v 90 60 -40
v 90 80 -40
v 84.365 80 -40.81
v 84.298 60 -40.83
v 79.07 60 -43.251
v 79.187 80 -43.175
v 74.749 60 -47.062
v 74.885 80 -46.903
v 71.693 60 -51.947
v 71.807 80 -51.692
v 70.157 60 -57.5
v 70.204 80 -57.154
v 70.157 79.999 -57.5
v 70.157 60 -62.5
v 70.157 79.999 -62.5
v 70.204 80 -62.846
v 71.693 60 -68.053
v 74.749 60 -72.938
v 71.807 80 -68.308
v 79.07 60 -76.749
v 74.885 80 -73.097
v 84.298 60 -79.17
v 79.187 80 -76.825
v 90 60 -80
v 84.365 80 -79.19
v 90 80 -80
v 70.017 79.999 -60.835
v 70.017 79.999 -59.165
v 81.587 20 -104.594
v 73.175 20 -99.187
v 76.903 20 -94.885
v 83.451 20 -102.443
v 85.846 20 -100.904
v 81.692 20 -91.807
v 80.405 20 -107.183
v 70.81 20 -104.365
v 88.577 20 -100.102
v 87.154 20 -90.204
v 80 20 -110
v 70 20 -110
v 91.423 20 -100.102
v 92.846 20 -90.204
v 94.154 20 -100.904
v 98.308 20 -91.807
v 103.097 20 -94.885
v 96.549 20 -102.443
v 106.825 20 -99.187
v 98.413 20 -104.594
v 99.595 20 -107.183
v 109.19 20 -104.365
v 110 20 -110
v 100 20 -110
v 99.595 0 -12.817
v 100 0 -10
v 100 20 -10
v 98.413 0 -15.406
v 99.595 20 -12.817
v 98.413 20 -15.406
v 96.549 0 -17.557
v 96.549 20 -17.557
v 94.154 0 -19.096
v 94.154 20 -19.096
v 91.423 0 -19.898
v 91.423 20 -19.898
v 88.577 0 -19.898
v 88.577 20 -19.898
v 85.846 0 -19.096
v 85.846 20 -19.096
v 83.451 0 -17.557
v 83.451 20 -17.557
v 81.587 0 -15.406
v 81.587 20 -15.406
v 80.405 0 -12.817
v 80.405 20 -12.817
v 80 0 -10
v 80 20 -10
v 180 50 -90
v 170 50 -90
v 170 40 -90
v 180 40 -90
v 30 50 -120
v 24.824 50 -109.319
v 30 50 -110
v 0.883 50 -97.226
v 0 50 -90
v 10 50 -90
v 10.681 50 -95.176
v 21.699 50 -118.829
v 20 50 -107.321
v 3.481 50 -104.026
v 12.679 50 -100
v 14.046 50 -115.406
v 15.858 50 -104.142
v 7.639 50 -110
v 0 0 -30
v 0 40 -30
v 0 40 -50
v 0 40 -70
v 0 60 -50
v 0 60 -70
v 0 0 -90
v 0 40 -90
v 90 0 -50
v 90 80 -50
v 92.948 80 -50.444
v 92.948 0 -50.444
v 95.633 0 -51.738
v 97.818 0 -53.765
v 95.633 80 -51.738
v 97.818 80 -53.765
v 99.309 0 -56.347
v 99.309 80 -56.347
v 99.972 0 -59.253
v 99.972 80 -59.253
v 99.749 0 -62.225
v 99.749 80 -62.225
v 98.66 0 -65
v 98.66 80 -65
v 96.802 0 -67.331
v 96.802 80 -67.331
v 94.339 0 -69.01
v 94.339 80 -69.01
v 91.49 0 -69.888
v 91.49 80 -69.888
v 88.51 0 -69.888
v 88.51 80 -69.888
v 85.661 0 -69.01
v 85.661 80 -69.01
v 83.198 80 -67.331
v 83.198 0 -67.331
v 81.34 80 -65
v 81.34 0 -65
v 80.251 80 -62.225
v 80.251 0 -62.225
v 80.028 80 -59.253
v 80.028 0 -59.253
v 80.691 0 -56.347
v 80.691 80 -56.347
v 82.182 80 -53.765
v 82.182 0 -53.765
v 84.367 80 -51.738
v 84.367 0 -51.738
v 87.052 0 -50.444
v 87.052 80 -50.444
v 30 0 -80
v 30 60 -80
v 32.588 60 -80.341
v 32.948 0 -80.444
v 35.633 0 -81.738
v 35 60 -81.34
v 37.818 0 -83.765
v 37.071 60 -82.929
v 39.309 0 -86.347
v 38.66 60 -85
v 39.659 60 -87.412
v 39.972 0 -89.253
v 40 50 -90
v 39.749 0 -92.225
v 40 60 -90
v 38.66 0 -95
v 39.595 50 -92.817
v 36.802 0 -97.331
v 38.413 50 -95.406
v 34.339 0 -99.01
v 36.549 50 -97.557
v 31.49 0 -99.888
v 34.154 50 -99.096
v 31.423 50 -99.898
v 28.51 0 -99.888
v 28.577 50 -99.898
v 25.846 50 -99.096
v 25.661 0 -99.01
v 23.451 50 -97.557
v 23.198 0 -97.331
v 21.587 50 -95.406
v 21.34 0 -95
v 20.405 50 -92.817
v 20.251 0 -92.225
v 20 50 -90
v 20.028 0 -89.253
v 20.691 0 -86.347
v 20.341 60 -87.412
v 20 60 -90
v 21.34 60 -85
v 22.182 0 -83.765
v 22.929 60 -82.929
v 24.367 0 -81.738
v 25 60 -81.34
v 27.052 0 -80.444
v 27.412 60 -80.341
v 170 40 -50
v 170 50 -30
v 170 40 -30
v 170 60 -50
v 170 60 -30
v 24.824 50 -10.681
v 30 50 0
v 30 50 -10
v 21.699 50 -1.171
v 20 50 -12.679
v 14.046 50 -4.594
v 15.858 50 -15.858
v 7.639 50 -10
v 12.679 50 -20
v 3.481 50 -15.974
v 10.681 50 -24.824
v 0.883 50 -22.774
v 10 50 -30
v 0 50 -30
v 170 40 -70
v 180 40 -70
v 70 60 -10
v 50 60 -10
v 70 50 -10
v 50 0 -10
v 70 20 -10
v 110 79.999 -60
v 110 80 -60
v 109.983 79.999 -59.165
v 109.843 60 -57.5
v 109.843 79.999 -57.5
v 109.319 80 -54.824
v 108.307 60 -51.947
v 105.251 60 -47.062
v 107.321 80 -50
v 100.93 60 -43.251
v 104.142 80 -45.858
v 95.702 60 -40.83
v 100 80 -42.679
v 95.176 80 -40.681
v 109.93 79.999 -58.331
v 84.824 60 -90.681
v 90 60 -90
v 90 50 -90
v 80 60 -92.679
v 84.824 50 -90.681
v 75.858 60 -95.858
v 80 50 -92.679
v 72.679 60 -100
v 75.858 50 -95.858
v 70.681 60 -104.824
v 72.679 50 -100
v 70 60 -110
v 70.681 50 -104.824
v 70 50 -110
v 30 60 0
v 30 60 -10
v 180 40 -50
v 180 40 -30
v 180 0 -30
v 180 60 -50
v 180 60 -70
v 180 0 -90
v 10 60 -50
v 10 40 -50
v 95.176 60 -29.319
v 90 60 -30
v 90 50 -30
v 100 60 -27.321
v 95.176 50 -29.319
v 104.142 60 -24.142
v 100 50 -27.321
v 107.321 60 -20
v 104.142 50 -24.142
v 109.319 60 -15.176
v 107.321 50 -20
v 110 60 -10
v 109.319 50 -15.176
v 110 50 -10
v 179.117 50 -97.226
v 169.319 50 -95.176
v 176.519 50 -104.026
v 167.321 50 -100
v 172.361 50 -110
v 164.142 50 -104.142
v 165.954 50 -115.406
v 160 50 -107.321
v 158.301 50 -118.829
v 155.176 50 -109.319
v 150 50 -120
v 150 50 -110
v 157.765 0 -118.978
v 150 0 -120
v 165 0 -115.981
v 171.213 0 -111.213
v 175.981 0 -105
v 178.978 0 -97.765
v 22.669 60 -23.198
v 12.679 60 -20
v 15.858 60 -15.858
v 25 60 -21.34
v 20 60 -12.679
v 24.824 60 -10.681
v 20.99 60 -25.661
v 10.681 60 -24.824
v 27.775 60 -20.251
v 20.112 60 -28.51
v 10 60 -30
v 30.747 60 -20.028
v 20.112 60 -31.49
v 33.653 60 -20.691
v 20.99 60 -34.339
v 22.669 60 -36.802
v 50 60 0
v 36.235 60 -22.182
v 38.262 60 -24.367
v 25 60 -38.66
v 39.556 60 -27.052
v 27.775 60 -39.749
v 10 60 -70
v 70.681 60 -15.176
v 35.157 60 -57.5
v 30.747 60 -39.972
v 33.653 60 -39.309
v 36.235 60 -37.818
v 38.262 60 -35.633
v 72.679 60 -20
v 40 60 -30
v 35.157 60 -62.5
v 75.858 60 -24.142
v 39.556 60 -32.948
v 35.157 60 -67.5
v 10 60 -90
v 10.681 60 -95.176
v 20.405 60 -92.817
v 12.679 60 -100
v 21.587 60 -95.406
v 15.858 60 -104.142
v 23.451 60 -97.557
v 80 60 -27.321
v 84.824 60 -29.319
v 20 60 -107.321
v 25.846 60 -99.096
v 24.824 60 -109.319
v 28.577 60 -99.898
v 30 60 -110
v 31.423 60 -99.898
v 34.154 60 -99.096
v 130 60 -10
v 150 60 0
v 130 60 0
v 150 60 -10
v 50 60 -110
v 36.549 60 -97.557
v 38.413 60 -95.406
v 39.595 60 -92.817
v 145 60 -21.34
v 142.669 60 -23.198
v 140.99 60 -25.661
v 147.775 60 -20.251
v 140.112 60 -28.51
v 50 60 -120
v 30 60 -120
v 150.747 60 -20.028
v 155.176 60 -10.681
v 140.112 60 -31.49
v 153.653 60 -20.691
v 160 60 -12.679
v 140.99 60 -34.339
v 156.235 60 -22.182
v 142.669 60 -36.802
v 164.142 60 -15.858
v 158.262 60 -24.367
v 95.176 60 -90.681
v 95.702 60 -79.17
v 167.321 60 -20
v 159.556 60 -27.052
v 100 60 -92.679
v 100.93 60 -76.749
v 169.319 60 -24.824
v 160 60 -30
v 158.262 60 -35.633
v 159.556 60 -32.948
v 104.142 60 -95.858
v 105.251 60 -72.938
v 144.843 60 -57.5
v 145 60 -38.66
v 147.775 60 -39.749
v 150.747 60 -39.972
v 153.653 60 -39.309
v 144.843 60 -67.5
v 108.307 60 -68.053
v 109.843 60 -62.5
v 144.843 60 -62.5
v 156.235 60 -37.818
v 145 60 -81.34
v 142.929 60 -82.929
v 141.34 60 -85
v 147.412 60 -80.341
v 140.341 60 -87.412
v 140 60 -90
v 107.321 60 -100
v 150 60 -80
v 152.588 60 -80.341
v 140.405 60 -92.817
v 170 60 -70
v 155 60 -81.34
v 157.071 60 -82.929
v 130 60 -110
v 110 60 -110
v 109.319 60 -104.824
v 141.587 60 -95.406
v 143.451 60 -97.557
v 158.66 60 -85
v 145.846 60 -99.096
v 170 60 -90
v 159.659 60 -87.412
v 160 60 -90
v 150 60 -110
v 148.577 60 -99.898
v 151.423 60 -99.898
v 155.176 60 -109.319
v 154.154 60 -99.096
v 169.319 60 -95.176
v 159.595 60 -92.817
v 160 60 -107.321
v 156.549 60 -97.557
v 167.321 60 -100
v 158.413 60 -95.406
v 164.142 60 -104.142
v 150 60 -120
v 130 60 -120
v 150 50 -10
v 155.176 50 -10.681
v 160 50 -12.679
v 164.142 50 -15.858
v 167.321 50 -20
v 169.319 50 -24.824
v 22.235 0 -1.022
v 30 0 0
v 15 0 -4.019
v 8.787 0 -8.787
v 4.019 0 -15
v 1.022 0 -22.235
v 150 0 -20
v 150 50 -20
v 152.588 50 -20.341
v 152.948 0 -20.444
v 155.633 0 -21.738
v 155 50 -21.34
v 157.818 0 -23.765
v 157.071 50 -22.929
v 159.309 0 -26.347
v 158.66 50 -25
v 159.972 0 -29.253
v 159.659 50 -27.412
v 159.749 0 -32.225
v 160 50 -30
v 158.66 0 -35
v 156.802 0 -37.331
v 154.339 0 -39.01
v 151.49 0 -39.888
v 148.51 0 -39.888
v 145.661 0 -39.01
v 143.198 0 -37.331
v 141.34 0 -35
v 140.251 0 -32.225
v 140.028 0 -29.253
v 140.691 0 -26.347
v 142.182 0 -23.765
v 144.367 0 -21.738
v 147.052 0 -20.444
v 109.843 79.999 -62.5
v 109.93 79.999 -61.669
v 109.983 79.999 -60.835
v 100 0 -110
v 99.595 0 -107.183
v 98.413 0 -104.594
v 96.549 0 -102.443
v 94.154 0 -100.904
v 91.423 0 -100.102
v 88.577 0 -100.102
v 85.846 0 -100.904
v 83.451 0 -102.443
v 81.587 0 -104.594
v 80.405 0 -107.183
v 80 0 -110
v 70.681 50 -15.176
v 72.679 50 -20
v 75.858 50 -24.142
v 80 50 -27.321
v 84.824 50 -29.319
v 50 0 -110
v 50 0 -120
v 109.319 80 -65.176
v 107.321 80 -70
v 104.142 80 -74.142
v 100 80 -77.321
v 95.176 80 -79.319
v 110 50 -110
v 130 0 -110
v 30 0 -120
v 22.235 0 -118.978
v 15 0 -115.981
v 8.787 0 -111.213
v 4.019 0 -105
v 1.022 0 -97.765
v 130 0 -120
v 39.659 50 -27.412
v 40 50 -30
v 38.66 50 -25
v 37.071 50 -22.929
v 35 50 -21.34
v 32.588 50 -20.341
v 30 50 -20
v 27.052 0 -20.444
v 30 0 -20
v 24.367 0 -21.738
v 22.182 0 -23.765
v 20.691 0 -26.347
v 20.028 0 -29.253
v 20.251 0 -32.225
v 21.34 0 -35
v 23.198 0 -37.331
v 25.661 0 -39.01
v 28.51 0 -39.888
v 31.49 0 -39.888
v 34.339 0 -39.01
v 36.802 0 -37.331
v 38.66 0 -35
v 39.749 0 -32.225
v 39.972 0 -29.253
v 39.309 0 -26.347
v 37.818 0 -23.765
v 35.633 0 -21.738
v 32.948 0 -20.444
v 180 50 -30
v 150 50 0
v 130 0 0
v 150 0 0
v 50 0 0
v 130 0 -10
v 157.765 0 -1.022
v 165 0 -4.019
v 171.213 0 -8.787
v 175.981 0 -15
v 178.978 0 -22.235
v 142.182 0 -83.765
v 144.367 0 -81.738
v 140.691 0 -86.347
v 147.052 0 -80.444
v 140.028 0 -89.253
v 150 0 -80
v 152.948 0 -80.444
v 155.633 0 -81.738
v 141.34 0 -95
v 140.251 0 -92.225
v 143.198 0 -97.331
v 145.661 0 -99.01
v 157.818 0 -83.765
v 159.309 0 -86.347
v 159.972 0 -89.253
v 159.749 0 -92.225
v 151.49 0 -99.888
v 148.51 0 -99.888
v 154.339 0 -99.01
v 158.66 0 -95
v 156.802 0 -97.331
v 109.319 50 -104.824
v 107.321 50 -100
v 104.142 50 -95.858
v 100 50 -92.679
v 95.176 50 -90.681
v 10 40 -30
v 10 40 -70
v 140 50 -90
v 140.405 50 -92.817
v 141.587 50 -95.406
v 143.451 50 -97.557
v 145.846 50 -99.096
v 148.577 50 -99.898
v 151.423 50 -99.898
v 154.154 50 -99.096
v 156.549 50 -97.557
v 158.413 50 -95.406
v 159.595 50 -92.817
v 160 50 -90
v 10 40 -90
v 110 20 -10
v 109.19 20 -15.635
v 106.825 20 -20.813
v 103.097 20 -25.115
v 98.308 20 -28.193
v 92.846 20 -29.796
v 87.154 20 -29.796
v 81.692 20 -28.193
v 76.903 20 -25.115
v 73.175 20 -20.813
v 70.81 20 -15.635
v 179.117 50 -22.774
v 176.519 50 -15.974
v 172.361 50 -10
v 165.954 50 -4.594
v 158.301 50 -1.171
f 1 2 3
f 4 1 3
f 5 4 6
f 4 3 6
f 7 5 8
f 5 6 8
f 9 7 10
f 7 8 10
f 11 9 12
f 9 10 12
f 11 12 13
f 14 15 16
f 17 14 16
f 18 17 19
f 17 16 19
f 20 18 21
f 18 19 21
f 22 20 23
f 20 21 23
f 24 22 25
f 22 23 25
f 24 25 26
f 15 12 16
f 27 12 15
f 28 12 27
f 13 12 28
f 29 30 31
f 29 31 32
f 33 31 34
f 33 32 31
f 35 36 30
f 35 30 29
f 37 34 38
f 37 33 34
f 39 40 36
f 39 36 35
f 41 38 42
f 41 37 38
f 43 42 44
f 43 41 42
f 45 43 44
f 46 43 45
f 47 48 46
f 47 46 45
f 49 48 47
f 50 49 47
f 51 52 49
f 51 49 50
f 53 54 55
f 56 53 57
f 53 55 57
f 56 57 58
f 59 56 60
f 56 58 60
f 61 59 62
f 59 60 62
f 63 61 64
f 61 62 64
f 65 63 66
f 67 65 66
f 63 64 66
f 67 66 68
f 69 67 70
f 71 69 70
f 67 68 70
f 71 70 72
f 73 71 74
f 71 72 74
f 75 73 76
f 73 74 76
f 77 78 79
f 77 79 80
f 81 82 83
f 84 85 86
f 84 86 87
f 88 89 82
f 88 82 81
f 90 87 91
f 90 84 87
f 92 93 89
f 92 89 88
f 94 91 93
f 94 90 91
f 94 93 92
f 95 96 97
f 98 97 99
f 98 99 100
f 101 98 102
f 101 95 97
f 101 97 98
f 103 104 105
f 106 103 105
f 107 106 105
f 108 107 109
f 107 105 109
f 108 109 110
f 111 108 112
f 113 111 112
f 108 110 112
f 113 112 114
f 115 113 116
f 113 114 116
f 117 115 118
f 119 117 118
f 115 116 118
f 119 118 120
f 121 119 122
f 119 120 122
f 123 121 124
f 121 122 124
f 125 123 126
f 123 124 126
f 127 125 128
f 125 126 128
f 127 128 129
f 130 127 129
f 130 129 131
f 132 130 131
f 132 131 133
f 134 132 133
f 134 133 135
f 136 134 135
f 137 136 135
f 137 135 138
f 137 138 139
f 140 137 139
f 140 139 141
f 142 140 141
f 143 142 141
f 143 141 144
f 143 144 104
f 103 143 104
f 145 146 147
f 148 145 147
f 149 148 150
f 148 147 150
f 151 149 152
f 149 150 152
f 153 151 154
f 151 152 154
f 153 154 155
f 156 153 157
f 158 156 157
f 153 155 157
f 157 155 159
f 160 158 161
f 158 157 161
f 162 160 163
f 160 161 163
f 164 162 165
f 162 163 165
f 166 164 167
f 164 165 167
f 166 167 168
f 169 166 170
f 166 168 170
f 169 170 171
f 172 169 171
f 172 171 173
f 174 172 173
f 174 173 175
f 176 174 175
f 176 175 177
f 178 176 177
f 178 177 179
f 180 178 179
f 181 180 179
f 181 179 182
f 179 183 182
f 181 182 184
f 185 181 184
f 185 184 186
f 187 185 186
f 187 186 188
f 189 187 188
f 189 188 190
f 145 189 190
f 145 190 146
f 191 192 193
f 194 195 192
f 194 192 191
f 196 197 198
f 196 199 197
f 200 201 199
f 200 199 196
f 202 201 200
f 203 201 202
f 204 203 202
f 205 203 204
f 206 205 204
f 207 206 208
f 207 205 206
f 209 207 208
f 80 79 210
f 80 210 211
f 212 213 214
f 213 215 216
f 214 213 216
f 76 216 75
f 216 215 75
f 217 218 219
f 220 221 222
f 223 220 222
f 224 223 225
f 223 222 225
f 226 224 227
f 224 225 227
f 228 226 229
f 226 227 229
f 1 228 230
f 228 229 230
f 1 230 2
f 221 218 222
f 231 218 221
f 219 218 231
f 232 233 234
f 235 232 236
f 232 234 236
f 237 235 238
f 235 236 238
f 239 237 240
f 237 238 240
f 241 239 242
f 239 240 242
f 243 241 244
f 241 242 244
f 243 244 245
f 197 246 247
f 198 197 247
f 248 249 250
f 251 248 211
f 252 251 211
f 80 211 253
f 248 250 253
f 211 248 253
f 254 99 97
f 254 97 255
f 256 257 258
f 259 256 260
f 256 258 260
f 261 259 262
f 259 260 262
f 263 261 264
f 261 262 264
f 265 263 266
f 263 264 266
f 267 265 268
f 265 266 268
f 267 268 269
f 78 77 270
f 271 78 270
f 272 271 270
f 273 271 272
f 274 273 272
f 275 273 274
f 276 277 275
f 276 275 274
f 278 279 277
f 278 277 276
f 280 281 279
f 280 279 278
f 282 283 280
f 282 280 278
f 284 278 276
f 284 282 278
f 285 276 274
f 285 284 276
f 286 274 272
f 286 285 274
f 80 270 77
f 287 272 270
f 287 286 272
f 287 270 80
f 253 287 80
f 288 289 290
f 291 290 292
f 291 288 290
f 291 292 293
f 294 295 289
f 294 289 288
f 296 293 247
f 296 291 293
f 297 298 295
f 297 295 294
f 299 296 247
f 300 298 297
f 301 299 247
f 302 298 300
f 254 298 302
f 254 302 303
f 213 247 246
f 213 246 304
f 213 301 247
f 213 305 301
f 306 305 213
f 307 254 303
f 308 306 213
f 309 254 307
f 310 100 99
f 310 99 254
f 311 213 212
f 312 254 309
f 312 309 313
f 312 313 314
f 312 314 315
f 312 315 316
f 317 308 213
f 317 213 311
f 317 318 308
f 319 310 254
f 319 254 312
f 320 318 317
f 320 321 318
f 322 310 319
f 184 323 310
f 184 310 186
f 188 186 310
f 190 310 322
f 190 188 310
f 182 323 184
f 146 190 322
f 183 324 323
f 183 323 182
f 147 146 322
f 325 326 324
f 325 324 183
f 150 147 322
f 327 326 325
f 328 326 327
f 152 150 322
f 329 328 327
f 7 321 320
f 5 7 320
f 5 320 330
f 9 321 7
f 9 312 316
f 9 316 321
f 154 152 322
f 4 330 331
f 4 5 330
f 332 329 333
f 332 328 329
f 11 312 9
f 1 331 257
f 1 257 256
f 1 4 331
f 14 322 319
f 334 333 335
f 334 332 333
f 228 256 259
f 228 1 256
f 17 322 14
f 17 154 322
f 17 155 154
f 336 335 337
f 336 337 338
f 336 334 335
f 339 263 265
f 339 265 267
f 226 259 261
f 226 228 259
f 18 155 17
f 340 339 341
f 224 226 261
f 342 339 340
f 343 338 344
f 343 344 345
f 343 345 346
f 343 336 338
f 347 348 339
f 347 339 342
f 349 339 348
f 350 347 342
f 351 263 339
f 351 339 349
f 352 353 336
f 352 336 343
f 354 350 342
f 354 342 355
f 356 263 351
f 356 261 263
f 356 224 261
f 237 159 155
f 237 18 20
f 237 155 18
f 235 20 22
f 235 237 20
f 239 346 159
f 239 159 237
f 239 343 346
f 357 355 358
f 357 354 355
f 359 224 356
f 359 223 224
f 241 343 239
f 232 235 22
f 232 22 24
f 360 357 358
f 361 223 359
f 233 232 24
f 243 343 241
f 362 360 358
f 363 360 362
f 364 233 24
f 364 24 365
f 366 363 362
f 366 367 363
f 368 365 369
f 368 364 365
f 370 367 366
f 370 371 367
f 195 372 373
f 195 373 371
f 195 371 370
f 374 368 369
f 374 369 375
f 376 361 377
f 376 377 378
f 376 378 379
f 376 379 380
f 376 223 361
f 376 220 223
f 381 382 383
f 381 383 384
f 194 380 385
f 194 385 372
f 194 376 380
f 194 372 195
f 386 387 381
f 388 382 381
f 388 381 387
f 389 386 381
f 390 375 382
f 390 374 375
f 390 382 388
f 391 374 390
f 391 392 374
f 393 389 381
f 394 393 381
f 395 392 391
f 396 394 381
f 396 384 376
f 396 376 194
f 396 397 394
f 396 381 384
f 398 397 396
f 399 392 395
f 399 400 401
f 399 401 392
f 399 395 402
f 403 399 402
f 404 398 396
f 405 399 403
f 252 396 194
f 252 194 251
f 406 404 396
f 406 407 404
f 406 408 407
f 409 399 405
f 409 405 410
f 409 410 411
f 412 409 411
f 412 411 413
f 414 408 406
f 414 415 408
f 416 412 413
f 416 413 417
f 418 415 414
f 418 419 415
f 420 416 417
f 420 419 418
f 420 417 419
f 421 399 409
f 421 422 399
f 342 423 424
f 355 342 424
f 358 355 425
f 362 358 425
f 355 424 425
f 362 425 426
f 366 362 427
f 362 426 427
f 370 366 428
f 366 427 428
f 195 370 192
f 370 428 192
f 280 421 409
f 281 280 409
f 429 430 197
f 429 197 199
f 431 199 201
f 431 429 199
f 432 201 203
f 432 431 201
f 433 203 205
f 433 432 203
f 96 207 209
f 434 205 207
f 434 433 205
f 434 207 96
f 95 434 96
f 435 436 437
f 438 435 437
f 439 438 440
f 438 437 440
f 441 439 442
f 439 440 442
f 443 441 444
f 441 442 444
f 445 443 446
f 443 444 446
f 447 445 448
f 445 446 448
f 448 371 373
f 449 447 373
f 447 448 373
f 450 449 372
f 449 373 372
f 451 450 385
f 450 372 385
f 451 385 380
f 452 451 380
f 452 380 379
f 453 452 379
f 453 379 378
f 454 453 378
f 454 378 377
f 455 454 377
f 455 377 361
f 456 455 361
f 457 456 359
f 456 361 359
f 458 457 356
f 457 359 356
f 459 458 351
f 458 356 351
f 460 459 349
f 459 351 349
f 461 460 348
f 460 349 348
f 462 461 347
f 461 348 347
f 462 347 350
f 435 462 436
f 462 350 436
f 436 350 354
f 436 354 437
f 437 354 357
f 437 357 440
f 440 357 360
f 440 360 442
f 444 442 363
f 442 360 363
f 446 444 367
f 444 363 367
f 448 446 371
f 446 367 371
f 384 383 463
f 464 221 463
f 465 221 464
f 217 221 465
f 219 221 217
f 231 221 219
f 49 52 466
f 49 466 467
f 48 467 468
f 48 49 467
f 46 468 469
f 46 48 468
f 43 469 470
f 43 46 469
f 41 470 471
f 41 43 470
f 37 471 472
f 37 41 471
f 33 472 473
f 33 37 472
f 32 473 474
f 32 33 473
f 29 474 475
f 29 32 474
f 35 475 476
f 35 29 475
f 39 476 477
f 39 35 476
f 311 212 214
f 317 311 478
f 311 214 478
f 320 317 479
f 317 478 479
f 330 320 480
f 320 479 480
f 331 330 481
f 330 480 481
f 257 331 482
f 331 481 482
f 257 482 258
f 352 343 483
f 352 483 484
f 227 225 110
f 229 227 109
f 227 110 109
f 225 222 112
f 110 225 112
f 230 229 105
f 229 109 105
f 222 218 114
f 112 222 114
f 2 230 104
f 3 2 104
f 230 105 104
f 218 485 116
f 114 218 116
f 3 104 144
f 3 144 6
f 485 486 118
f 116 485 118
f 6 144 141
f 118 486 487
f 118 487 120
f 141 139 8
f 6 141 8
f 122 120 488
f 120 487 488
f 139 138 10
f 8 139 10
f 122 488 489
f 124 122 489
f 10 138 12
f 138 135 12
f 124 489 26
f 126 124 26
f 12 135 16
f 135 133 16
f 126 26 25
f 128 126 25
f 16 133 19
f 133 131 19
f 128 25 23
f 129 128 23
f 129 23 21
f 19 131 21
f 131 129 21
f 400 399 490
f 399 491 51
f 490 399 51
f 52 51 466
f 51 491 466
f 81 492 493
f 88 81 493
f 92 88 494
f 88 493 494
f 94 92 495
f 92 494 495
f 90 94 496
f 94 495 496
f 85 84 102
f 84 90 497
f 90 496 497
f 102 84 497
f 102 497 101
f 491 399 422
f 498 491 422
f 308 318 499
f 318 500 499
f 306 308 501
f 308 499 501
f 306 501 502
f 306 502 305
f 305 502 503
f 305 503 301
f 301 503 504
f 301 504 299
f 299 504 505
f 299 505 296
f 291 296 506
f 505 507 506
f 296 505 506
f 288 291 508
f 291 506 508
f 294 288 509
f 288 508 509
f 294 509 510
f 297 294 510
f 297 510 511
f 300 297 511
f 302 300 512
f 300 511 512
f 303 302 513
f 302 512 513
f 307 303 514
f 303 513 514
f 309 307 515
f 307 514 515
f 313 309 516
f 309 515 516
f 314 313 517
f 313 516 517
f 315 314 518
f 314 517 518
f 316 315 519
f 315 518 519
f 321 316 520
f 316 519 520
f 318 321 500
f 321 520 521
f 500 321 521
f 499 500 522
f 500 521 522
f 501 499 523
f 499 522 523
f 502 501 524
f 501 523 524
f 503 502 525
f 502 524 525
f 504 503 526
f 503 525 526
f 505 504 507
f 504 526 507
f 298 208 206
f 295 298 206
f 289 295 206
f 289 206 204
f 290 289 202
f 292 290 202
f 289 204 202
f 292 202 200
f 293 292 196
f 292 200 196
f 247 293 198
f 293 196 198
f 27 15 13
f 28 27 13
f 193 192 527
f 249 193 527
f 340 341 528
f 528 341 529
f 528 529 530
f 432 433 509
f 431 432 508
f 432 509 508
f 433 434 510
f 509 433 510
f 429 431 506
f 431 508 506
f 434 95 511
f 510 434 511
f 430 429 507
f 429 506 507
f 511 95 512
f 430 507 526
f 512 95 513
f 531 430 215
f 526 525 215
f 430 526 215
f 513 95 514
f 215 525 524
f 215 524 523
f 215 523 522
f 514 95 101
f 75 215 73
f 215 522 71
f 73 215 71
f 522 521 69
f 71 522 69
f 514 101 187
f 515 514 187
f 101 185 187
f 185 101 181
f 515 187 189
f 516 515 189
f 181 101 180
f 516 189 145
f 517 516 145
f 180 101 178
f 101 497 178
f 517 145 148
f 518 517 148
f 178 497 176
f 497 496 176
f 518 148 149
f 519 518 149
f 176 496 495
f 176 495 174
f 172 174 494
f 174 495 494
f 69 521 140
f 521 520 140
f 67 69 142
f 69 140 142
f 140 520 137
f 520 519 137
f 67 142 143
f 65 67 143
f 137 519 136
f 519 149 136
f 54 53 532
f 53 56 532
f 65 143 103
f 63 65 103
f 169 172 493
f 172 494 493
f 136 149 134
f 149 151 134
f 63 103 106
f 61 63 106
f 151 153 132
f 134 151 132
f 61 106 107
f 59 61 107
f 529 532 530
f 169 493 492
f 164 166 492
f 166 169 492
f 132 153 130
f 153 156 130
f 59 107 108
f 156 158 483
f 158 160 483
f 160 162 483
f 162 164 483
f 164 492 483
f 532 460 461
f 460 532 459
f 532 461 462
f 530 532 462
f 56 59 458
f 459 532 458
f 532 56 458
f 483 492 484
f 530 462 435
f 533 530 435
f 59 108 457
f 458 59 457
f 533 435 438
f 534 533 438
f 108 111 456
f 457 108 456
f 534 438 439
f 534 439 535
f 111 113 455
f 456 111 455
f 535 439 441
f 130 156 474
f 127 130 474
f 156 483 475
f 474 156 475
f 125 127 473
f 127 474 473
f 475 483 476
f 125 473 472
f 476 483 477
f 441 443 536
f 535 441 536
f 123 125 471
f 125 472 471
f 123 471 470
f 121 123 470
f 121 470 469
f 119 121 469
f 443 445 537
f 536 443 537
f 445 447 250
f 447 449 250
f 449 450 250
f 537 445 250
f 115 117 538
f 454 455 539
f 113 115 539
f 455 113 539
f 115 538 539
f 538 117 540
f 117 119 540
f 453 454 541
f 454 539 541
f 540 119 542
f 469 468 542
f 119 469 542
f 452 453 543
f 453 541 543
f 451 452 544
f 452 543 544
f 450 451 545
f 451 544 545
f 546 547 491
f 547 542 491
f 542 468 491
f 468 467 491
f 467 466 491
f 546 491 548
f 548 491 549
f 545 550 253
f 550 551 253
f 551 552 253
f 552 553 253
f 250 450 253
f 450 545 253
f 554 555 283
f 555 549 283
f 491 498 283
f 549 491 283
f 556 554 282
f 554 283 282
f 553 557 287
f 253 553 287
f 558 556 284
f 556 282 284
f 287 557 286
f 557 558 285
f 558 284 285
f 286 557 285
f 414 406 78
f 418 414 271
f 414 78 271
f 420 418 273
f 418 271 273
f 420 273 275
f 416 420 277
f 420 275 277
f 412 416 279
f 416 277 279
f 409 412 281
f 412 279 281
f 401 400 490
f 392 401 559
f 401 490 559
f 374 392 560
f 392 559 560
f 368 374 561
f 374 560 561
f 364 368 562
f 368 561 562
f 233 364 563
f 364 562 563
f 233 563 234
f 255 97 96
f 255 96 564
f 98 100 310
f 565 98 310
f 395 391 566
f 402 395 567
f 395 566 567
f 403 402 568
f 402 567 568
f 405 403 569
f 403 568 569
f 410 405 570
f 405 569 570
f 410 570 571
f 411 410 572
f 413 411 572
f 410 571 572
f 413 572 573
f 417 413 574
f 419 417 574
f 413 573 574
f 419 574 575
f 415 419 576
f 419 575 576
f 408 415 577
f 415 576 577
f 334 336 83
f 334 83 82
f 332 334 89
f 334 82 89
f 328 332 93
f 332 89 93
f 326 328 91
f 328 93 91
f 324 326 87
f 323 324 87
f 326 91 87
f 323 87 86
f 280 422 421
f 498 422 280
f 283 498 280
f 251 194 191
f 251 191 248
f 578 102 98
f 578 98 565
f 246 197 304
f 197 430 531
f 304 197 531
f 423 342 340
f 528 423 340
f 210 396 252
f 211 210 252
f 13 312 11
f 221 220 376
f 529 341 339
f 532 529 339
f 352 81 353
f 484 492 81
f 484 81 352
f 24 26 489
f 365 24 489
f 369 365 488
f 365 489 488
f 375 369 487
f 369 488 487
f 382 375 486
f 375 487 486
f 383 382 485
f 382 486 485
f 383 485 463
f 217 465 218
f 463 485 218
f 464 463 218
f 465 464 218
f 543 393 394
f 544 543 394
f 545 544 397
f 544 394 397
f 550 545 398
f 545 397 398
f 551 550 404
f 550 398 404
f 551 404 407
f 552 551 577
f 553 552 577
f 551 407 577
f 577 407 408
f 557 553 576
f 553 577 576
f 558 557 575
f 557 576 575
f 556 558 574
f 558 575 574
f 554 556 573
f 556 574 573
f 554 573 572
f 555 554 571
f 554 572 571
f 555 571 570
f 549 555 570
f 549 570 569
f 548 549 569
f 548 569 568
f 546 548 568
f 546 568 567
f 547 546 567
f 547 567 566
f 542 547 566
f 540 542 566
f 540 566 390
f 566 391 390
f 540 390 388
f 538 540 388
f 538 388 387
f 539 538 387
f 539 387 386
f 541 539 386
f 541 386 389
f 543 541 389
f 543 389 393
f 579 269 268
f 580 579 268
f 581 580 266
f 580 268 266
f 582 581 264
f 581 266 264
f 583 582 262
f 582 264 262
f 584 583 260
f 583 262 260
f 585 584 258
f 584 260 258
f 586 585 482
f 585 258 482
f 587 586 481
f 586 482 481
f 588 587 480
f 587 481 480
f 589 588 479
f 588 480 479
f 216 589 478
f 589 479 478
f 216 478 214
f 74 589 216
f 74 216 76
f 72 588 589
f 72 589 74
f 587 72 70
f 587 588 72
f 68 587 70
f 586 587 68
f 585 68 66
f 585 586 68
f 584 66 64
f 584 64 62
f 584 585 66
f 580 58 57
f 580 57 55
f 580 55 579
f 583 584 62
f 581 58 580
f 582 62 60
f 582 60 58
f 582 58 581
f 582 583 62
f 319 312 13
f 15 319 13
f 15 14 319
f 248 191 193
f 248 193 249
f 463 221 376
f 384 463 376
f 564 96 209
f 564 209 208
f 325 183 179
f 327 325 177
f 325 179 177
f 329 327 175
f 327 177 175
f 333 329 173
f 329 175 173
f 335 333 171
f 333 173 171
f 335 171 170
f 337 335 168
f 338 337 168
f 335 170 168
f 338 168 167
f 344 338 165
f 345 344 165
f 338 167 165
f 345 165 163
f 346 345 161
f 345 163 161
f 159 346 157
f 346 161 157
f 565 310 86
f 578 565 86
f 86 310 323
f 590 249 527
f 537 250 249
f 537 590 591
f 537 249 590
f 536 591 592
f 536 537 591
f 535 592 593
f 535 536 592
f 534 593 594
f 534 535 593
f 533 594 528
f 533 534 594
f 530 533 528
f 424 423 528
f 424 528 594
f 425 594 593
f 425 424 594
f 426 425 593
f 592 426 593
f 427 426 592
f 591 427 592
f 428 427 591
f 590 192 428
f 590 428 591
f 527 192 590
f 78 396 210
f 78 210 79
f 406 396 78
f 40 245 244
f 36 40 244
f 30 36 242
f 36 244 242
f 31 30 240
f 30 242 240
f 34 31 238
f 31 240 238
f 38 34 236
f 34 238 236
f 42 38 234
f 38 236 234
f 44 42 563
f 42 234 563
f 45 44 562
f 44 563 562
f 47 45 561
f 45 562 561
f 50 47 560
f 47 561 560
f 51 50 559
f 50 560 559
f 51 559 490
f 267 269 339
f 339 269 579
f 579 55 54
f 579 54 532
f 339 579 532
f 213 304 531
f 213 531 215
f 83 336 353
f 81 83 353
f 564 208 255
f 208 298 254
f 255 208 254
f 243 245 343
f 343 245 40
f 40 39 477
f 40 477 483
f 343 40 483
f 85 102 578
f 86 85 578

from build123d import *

# Parameters (mm, degrees)
SKETCH1_W           = 180
SKETCH1_H           = 120
BOSS_EXTRUDE2_DEPTH = 80
CUT_EXTRUDE1_DEPTH  = 150
CUT_EXTRUDE2_DEPTH  = 150
SKETCH4_R           = 10
CUT_EXTRUDE3_DEPTH  = 150
CUT_EXTRUDE4_DEPTH  = 60
CUT_EXTRUDE5_DEPTH  = 60
SKETCH7_R           = 10
CUT_EXTRUDE7_DEPTH  = 139
SKETCH8_W           = 80
SKETCH8_H           = 10
CUT_EXTRUDE8_DEPTH  = 139
BOSS_EXTRUDE3_DEPTH = 60
CUT_EXTRUDE9_DEPTH  = 256
CUT_EXTRUDE10_DEPTH = 60
CUT_EXTRUDE11_DEPTH = 60
SKETCH13_W          = 40
SKETCH13_H          = 20
SKETCH13_W_2        = 20
SKETCH13_H_2        = 10
CUT_EXTRUDE12_DEPTH = 209
CUT_EXTRUDE13_DEPTH = 20
CUT_EXTRUDE14_DEPTH = 10
CUT_EXTRUDE15_DEPTH = 10
CUT_EXTRUDE16_DEPTH = 10
CUT_EXTRUDE17_DEPTH = 10
BOSS_EXTRUDE4_DEPTH = 10
BOSS_EXTRUDE5_DEPTH = 10
SKETCH21_W          = 10
SKETCH21_H          = 20
CUT_EXTRUDE20_DEPTH = 20
SKETCH22_W          = 35
SKETCH22_H          = 5
BOSS_EXTRUDE9_DEPTH = 19.999
CUT_EXTRUDE21_DEPTH = 10


with BuildPart() as part:
    # Sketch1 → Boss-Extrude2 (new body)
    with BuildSketch(Plane(origin=(0, 0, 0), x_dir=(1, 0, 0), z_dir=(0, 1, 0))):
        with Locations((90, 60)):
            Rectangle(SKETCH1_W, SKETCH1_H)
    extrude(amount=BOSS_EXTRUDE2_DEPTH)

    # Sketch2 → Cut-Extrude1 (cut)
    with BuildSketch(Plane(origin=(0, 0, 0), x_dir=(1, 0, 0), z_dir=(0, 1, 0))):
        with BuildLine():
            ThreePointArc((30, 0), (8.786796564, 8.786796564), (0, 30))
            Line((0, 30), (0, 0))
            Line((0, 0), (30, 0))
        make_face()
        with BuildLine():
            Line((180, 0), (180, 30))
            ThreePointArc((180, 30), (171.213203436, 8.786796564), (150, 0))
            Line((150, 0), (180, 0))
        make_face()
        with BuildLine():
            Line((180, 120), (150, 120))
            ThreePointArc((150, 120), (171.213203436, 111.213203436), (180, 90))
            Line((180, 90), (180, 120))
        make_face()
        with BuildLine():
            Line((0, 120), (30, 120))
            ThreePointArc((30, 120), (8.786796564, 111.213203436), (0, 90))
            Line((0, 90), (0, 120))
        make_face()
    extrude(amount=CUT_EXTRUDE1_DEPTH, mode=Mode.SUBTRACT)

    # Sketch3 → Cut-Extrude2 (cut)
    with BuildSketch(Plane(origin=(0, 0, 0), x_dir=(1, 0, 0), z_dir=(0, 1, 0))):
        with BuildLine():
            Line((80, 120), (100, 120))
            ThreePointArc((100, 120), (90, 110), (80, 120))
        make_face()
        with BuildLine():
            Line((80, 0), (100, 0))
            ThreePointArc((100, 0), (90, 10), (80, 0))
        make_face()
    extrude(amount=CUT_EXTRUDE2_DEPTH, mode=Mode.SUBTRACT)

    # Sketch4 → Cut-Extrude3 (cut)
    with BuildSketch(Plane(origin=(0, 80, 0), x_dir=(1, 0, 0), z_dir=(0, 1, 0))):
        with Locations(Location((30, 90, 0), (0, 0, 270))):
            Circle(SKETCH4_R)
        with Locations(Location((150, 90, 0), (0, 0, 270))):
            Circle(SKETCH4_R)
        with Locations(Location((150, 30, 0), (0, 0, 270))):
            Circle(SKETCH4_R)
        with Locations(Location((30, 30, 0), (0, 0, 270))):
            Circle(SKETCH4_R)
    extrude(amount=-CUT_EXTRUDE3_DEPTH, mode=Mode.SUBTRACT)

    # Sketch5 → Cut-Extrude4 (cut)
    with BuildSketch(Plane(origin=(0, 80, 0), x_dir=(1, 0, 0), z_dir=(0, 1, 0))):
        with BuildLine():
            Line((70, 120), (80, 120))
            ThreePointArc((80, 120), (90, 110), (100, 120))
            Line((100, 120), (110, 120))
            ThreePointArc((110, 120), (90, 100), (70, 120))
        make_face()
    extrude(amount=-CUT_EXTRUDE4_DEPTH, mode=Mode.SUBTRACT)

    # Sketch6 → Cut-Extrude5 (cut)
    with BuildSketch(Plane(origin=(0, 80, 0), x_dir=(1, 0, 0), z_dir=(0, 1, 0))):
        with BuildLine():
            ThreePointArc((110, 0), (90, 20), (70, 0))
            Line((70, 0), (80, 0))
            ThreePointArc((80, 0), (90, 10), (100, 0))
            Line((100, 0), (110, 0))
        make_face()
    extrude(amount=-CUT_EXTRUDE5_DEPTH, mode=Mode.SUBTRACT)

    # Sketch7 → Cut-Extrude7 (cut)
    with BuildSketch(Plane(origin=(0, 80, 0), x_dir=(1, 0, 0), z_dir=(0, 1, 0))):
        with Locations(Location((90, 60, 0), (0, 0, 270))):
            Circle(SKETCH7_R)
    extrude(amount=-CUT_EXTRUDE7_DEPTH, mode=Mode.SUBTRACT)

    # Sketch8 → Cut-Extrude8 (cut)
    with BuildSketch(Plane(origin=(0, 80, 0), x_dir=(1, 0, 0), z_dir=(0, 1, 0))):
        with Locations((90, 115)):
            Rectangle(SKETCH8_W, SKETCH8_H)
        with Locations((90, 5)):
            Rectangle(SKETCH8_W, SKETCH8_H)
    extrude(amount=-CUT_EXTRUDE8_DEPTH, mode=Mode.SUBTRACT)

    # Sketch9 → Boss-Extrude3 (add)
    with BuildSketch(Plane(origin=(0, 20, 0), x_dir=(1, 0, 0), z_dir=(0, 1, 0))):
        with BuildLine():
            Line((72.679491924, 110), (107.320508076, 110))
            ThreePointArc((107.320508076, 110), (90, 100), (72.679491924, 110))
        make_face()
        with BuildLine():
            Line((72.679491924, 10), (107.320508076, 10))
            ThreePointArc((107.320508076, 10), (90, 20), (72.679491924, 10))
        make_face()
    extrude(amount=BOSS_EXTRUDE3_DEPTH)

    # Sketch10 → Cut-Extrude9 (cut)
    with BuildSketch(Plane(origin=(0, 80, 0), x_dir=(1, 0, 0), z_dir=(0, 1, 0))):
        with BuildLine():
            Line((80, 110), (100, 110))
            ThreePointArc((100, 110), (90, 100), (80, 110))
        make_face()
        with BuildLine():
            Line((80, 10), (100, 10))
            ThreePointArc((100, 10), (90, 20), (80, 10))
        make_face()
    extrude(amount=-CUT_EXTRUDE9_DEPTH, mode=Mode.SUBTRACT)

    # Sketch11 → Cut-Extrude10 (cut)
    with BuildSketch(Plane(origin=(0, 80, 0), x_dir=(1, 0, 0), z_dir=(0, 1, 0))):
        with BuildLine():
            Line((80, 110), (70, 110))
            ThreePointArc((70, 110), (90, 90), (110, 110))
            Line((110, 110), (100, 110))
            ThreePointArc((100, 110), (90, 100), (80, 110))
        make_face()
    extrude(amount=-CUT_EXTRUDE10_DEPTH, mode=Mode.SUBTRACT)

    # Sketch12 → Cut-Extrude11 (cut)
    with BuildSketch(Plane(origin=(0, 80, 0), x_dir=(1, 0, 0), z_dir=(0, 1, 0))):
        with BuildLine():
            ThreePointArc((110, 10), (90, 30), (70, 10))
            Line((70, 10), (80, 10))
            ThreePointArc((80, 10), (90, 20), (100, 10))
            Line((100, 10), (110, 10))
        make_face()
    extrude(amount=-CUT_EXTRUDE11_DEPTH, mode=Mode.SUBTRACT)

    # Sketch13 → Cut-Extrude12 (cut)
    with BuildSketch(Plane(origin=(0, 0, 0), x_dir=(0, 0, -1), z_dir=(1, 0, 0))):
        with Locations((100, 70)):
            Rectangle(SKETCH13_W, SKETCH13_H)
        with Locations((100, 55)):
            Rectangle(SKETCH13_W_2, SKETCH13_H_2)
        with Locations((20, 70)):
            Rectangle(SKETCH13_W, SKETCH13_H)
        with Locations((20, 55)):
            Rectangle(SKETCH13_W_2, SKETCH13_H_2)
    extrude(amount=CUT_EXTRUDE12_DEPTH, mode=Mode.SUBTRACT)

    # Sketch14 → Cut-Extrude13 (cut)
    with BuildSketch(Plane(origin=(0, 80, 0), x_dir=(1, 0, 0), z_dir=(0, 1, 0))):
        with BuildLine():
            Line((90, 80), (0, 80))
            Line((0, 80), (0, 40))
            Line((0, 40), (90, 40))
            ThreePointArc((90, 40), (70, 60), (90, 80))
        make_face()
        with BuildLine():
            Line((180, 80), (90, 80))
            ThreePointArc((90, 80), (104.142135624, 74.142135624), (110, 60))
            ThreePointArc((110, 60), (104.142135624, 45.857864376), (90, 40))
            Line((90, 40), (180, 40))
            Line((180, 40), (180, 80))
        make_face()
    extrude(amount=-CUT_EXTRUDE13_DEPTH, mode=Mode.SUBTRACT)

    # Sketch15 → Cut-Extrude14 (cut)
    with BuildSketch(Plane(origin=(0, 60, 0), x_dir=(1, 0, 0), z_dir=(0, 1, 0))):
        with BuildLine():
            Line((7.639320225, 110), (30, 110))
            Line((30, 110), (30, 120))
            ThreePointArc((30, 120), (17.752551286, 117.386127875), (7.639320225, 110))
        make_face()
    extrude(amount=-CUT_EXTRUDE14_DEPTH, mode=Mode.SUBTRACT)

    # Sketch16 → Cut-Extrude15 (cut)
    with BuildSketch(Plane(origin=(0, 60, 0), x_dir=(1, 0, 0), z_dir=(0, 1, 0))):
        with BuildLine():
            ThreePointArc((7.639320225, 10), (17.752551286, 2.613872125), (30, 0))
            Line((30, 0), (30, 10))
            Line((30, 10), (7.639320225, 10))
        make_face()
    extrude(amount=-CUT_EXTRUDE15_DEPTH, mode=Mode.SUBTRACT)

    # Sketch17 → Cut-Extrude16 (cut)
    with BuildSketch(Plane(origin=(0, 60, 0), x_dir=(1, 0, 0), z_dir=(0, 1, 0))):
        with BuildLine():
            Line((150, 10), (150, 0))
            ThreePointArc((150, 0), (162.247448714, 2.613872125), (172.360679775, 10))
            Line((172.360679775, 10), (150, 10))
        make_face()
    extrude(amount=-CUT_EXTRUDE16_DEPTH, mode=Mode.SUBTRACT)

    # Sketch18 → Cut-Extrude17 (cut)
    with BuildSketch(Plane(origin=(0, 60, 0), x_dir=(1, 0, 0), z_dir=(0, 1, 0))):
        with BuildLine():
            ThreePointArc((172.360679775, 110), (162.247448714, 117.386127875), (150, 120))
            Line((150, 120), (150, 110))
            Line((150, 110), (172.360679775, 110))
        make_face()
    extrude(amount=-CUT_EXTRUDE17_DEPTH, mode=Mode.SUBTRACT)

    # Sketch19 → Boss-Extrude4 (add)
    with BuildSketch(Plane(origin=(0, 50, 0), x_dir=(1, 0, 0), z_dir=(0, 1, 0))):
        with BuildLine():
            Line((40, 90), (90, 90))
            ThreePointArc((90, 90), (75.857864376, 95.857864376), (70, 110))
            Line((70, 110), (30, 110))
            ThreePointArc((30, 110), (15.857864376, 104.142135624), (10, 90))
            Line((10, 90), (20, 90))
            ThreePointArc((20, 90), (30, 100), (40, 90))
        make_face()
        with BuildLine():
            ThreePointArc((170, 90), (164.142135624, 104.142135624), (150, 110))
            Line((150, 110), (130, 110))
            Line((130, 110), (110, 110))
            ThreePointArc((110, 110), (104.142135624, 95.857864376), (90, 90))
            Line((90, 90), (140, 90))
            ThreePointArc((140, 90), (150, 100), (160, 90))
            Line((160, 90), (170, 90))
        make_face()
    extrude(amount=BOSS_EXTRUDE4_DEPTH)

    # Sketch20 → Boss-Extrude5 (add)
    with BuildSketch(Plane(origin=(0, 50, 0), x_dir=(1, 0, 0), z_dir=(0, 1, 0))):
        with BuildLine():
            Line((20, 30), (10, 30))
            ThreePointArc((10, 30), (15.857864376, 15.857864376), (30, 10))
            Line((30, 10), (50, 10))
            Line((50, 10), (70, 10))
            ThreePointArc((70, 10), (75.857864376, 24.142135624), (90, 30))
            Line((90, 30), (40, 30))
            ThreePointArc((40, 30), (30, 20), (20, 30))
        make_face()
        with BuildLine():
            Line((140, 30), (90, 30))
            ThreePointArc((90, 30), (104.142135624, 24.142135624), (110, 10))
            Line((110, 10), (130, 10))
            Line((130, 10), (150, 10))
            ThreePointArc((150, 10), (164.142135624, 15.857864376), (170, 30))
            Line((170, 30), (160, 30))
            ThreePointArc((160, 30), (150, 20), (140, 30))
        make_face()
    extrude(amount=BOSS_EXTRUDE5_DEPTH)

    # Sketch21 → Cut-Extrude20 (cut)
    with BuildSketch(Plane(origin=(0, 60, 0), x_dir=(1, 0, 0), z_dir=(0, 1, 0))):
        with Locations((5, 80)):
            Rectangle(SKETCH21_W, SKETCH21_H)
        with Locations((5, 40)):
            Rectangle(SKETCH21_W, SKETCH21_H)
        with Locations((175, 80)):
            Rectangle(SKETCH21_W, SKETCH21_H)
        with Locations((175, 40)):
            Rectangle(SKETCH21_W, SKETCH21_H)
    extrude(amount=-CUT_EXTRUDE20_DEPTH, mode=Mode.SUBTRACT)

    # Sketch22 → Boss-Extrude9 (add)
    with BuildSketch(Plane(origin=(0, 60, 0), x_dir=(1, 0, 0), z_dir=(0, 1, 0))):
        with BuildLine():
            Line((70.156865167, 62.5), (35.156865167, 62.5))
            Line((35.156865167, 62.5), (35.156865167, 57.5))
            Line((35.156865167, 57.5), (70.156865167, 57.5))
            ThreePointArc((70.156865167, 57.5), (70, 60), (70.156865167, 62.5))
        make_face()
        with Locations((127.343134833, 60)):
            Rectangle(SKETCH22_W, SKETCH22_H)
    extrude(amount=BOSS_EXTRUDE9_DEPTH)

    # Sketch23 → Cut-Extrude21 (cut)
    with BuildSketch(Plane.XY.offset(-57.5)):
        Polygon((35.156865167, 60), (70.156865167, 79.999), (35.156865167, 79.999), align=None)
        Polygon((109.843134833, 79.999), (144.843134833, 60), (144.843134833, 79.999), align=None)
    extrude(amount=-CUT_EXTRUDE21_DEPTH, mode=Mode.SUBTRACT)


solid = part.part
